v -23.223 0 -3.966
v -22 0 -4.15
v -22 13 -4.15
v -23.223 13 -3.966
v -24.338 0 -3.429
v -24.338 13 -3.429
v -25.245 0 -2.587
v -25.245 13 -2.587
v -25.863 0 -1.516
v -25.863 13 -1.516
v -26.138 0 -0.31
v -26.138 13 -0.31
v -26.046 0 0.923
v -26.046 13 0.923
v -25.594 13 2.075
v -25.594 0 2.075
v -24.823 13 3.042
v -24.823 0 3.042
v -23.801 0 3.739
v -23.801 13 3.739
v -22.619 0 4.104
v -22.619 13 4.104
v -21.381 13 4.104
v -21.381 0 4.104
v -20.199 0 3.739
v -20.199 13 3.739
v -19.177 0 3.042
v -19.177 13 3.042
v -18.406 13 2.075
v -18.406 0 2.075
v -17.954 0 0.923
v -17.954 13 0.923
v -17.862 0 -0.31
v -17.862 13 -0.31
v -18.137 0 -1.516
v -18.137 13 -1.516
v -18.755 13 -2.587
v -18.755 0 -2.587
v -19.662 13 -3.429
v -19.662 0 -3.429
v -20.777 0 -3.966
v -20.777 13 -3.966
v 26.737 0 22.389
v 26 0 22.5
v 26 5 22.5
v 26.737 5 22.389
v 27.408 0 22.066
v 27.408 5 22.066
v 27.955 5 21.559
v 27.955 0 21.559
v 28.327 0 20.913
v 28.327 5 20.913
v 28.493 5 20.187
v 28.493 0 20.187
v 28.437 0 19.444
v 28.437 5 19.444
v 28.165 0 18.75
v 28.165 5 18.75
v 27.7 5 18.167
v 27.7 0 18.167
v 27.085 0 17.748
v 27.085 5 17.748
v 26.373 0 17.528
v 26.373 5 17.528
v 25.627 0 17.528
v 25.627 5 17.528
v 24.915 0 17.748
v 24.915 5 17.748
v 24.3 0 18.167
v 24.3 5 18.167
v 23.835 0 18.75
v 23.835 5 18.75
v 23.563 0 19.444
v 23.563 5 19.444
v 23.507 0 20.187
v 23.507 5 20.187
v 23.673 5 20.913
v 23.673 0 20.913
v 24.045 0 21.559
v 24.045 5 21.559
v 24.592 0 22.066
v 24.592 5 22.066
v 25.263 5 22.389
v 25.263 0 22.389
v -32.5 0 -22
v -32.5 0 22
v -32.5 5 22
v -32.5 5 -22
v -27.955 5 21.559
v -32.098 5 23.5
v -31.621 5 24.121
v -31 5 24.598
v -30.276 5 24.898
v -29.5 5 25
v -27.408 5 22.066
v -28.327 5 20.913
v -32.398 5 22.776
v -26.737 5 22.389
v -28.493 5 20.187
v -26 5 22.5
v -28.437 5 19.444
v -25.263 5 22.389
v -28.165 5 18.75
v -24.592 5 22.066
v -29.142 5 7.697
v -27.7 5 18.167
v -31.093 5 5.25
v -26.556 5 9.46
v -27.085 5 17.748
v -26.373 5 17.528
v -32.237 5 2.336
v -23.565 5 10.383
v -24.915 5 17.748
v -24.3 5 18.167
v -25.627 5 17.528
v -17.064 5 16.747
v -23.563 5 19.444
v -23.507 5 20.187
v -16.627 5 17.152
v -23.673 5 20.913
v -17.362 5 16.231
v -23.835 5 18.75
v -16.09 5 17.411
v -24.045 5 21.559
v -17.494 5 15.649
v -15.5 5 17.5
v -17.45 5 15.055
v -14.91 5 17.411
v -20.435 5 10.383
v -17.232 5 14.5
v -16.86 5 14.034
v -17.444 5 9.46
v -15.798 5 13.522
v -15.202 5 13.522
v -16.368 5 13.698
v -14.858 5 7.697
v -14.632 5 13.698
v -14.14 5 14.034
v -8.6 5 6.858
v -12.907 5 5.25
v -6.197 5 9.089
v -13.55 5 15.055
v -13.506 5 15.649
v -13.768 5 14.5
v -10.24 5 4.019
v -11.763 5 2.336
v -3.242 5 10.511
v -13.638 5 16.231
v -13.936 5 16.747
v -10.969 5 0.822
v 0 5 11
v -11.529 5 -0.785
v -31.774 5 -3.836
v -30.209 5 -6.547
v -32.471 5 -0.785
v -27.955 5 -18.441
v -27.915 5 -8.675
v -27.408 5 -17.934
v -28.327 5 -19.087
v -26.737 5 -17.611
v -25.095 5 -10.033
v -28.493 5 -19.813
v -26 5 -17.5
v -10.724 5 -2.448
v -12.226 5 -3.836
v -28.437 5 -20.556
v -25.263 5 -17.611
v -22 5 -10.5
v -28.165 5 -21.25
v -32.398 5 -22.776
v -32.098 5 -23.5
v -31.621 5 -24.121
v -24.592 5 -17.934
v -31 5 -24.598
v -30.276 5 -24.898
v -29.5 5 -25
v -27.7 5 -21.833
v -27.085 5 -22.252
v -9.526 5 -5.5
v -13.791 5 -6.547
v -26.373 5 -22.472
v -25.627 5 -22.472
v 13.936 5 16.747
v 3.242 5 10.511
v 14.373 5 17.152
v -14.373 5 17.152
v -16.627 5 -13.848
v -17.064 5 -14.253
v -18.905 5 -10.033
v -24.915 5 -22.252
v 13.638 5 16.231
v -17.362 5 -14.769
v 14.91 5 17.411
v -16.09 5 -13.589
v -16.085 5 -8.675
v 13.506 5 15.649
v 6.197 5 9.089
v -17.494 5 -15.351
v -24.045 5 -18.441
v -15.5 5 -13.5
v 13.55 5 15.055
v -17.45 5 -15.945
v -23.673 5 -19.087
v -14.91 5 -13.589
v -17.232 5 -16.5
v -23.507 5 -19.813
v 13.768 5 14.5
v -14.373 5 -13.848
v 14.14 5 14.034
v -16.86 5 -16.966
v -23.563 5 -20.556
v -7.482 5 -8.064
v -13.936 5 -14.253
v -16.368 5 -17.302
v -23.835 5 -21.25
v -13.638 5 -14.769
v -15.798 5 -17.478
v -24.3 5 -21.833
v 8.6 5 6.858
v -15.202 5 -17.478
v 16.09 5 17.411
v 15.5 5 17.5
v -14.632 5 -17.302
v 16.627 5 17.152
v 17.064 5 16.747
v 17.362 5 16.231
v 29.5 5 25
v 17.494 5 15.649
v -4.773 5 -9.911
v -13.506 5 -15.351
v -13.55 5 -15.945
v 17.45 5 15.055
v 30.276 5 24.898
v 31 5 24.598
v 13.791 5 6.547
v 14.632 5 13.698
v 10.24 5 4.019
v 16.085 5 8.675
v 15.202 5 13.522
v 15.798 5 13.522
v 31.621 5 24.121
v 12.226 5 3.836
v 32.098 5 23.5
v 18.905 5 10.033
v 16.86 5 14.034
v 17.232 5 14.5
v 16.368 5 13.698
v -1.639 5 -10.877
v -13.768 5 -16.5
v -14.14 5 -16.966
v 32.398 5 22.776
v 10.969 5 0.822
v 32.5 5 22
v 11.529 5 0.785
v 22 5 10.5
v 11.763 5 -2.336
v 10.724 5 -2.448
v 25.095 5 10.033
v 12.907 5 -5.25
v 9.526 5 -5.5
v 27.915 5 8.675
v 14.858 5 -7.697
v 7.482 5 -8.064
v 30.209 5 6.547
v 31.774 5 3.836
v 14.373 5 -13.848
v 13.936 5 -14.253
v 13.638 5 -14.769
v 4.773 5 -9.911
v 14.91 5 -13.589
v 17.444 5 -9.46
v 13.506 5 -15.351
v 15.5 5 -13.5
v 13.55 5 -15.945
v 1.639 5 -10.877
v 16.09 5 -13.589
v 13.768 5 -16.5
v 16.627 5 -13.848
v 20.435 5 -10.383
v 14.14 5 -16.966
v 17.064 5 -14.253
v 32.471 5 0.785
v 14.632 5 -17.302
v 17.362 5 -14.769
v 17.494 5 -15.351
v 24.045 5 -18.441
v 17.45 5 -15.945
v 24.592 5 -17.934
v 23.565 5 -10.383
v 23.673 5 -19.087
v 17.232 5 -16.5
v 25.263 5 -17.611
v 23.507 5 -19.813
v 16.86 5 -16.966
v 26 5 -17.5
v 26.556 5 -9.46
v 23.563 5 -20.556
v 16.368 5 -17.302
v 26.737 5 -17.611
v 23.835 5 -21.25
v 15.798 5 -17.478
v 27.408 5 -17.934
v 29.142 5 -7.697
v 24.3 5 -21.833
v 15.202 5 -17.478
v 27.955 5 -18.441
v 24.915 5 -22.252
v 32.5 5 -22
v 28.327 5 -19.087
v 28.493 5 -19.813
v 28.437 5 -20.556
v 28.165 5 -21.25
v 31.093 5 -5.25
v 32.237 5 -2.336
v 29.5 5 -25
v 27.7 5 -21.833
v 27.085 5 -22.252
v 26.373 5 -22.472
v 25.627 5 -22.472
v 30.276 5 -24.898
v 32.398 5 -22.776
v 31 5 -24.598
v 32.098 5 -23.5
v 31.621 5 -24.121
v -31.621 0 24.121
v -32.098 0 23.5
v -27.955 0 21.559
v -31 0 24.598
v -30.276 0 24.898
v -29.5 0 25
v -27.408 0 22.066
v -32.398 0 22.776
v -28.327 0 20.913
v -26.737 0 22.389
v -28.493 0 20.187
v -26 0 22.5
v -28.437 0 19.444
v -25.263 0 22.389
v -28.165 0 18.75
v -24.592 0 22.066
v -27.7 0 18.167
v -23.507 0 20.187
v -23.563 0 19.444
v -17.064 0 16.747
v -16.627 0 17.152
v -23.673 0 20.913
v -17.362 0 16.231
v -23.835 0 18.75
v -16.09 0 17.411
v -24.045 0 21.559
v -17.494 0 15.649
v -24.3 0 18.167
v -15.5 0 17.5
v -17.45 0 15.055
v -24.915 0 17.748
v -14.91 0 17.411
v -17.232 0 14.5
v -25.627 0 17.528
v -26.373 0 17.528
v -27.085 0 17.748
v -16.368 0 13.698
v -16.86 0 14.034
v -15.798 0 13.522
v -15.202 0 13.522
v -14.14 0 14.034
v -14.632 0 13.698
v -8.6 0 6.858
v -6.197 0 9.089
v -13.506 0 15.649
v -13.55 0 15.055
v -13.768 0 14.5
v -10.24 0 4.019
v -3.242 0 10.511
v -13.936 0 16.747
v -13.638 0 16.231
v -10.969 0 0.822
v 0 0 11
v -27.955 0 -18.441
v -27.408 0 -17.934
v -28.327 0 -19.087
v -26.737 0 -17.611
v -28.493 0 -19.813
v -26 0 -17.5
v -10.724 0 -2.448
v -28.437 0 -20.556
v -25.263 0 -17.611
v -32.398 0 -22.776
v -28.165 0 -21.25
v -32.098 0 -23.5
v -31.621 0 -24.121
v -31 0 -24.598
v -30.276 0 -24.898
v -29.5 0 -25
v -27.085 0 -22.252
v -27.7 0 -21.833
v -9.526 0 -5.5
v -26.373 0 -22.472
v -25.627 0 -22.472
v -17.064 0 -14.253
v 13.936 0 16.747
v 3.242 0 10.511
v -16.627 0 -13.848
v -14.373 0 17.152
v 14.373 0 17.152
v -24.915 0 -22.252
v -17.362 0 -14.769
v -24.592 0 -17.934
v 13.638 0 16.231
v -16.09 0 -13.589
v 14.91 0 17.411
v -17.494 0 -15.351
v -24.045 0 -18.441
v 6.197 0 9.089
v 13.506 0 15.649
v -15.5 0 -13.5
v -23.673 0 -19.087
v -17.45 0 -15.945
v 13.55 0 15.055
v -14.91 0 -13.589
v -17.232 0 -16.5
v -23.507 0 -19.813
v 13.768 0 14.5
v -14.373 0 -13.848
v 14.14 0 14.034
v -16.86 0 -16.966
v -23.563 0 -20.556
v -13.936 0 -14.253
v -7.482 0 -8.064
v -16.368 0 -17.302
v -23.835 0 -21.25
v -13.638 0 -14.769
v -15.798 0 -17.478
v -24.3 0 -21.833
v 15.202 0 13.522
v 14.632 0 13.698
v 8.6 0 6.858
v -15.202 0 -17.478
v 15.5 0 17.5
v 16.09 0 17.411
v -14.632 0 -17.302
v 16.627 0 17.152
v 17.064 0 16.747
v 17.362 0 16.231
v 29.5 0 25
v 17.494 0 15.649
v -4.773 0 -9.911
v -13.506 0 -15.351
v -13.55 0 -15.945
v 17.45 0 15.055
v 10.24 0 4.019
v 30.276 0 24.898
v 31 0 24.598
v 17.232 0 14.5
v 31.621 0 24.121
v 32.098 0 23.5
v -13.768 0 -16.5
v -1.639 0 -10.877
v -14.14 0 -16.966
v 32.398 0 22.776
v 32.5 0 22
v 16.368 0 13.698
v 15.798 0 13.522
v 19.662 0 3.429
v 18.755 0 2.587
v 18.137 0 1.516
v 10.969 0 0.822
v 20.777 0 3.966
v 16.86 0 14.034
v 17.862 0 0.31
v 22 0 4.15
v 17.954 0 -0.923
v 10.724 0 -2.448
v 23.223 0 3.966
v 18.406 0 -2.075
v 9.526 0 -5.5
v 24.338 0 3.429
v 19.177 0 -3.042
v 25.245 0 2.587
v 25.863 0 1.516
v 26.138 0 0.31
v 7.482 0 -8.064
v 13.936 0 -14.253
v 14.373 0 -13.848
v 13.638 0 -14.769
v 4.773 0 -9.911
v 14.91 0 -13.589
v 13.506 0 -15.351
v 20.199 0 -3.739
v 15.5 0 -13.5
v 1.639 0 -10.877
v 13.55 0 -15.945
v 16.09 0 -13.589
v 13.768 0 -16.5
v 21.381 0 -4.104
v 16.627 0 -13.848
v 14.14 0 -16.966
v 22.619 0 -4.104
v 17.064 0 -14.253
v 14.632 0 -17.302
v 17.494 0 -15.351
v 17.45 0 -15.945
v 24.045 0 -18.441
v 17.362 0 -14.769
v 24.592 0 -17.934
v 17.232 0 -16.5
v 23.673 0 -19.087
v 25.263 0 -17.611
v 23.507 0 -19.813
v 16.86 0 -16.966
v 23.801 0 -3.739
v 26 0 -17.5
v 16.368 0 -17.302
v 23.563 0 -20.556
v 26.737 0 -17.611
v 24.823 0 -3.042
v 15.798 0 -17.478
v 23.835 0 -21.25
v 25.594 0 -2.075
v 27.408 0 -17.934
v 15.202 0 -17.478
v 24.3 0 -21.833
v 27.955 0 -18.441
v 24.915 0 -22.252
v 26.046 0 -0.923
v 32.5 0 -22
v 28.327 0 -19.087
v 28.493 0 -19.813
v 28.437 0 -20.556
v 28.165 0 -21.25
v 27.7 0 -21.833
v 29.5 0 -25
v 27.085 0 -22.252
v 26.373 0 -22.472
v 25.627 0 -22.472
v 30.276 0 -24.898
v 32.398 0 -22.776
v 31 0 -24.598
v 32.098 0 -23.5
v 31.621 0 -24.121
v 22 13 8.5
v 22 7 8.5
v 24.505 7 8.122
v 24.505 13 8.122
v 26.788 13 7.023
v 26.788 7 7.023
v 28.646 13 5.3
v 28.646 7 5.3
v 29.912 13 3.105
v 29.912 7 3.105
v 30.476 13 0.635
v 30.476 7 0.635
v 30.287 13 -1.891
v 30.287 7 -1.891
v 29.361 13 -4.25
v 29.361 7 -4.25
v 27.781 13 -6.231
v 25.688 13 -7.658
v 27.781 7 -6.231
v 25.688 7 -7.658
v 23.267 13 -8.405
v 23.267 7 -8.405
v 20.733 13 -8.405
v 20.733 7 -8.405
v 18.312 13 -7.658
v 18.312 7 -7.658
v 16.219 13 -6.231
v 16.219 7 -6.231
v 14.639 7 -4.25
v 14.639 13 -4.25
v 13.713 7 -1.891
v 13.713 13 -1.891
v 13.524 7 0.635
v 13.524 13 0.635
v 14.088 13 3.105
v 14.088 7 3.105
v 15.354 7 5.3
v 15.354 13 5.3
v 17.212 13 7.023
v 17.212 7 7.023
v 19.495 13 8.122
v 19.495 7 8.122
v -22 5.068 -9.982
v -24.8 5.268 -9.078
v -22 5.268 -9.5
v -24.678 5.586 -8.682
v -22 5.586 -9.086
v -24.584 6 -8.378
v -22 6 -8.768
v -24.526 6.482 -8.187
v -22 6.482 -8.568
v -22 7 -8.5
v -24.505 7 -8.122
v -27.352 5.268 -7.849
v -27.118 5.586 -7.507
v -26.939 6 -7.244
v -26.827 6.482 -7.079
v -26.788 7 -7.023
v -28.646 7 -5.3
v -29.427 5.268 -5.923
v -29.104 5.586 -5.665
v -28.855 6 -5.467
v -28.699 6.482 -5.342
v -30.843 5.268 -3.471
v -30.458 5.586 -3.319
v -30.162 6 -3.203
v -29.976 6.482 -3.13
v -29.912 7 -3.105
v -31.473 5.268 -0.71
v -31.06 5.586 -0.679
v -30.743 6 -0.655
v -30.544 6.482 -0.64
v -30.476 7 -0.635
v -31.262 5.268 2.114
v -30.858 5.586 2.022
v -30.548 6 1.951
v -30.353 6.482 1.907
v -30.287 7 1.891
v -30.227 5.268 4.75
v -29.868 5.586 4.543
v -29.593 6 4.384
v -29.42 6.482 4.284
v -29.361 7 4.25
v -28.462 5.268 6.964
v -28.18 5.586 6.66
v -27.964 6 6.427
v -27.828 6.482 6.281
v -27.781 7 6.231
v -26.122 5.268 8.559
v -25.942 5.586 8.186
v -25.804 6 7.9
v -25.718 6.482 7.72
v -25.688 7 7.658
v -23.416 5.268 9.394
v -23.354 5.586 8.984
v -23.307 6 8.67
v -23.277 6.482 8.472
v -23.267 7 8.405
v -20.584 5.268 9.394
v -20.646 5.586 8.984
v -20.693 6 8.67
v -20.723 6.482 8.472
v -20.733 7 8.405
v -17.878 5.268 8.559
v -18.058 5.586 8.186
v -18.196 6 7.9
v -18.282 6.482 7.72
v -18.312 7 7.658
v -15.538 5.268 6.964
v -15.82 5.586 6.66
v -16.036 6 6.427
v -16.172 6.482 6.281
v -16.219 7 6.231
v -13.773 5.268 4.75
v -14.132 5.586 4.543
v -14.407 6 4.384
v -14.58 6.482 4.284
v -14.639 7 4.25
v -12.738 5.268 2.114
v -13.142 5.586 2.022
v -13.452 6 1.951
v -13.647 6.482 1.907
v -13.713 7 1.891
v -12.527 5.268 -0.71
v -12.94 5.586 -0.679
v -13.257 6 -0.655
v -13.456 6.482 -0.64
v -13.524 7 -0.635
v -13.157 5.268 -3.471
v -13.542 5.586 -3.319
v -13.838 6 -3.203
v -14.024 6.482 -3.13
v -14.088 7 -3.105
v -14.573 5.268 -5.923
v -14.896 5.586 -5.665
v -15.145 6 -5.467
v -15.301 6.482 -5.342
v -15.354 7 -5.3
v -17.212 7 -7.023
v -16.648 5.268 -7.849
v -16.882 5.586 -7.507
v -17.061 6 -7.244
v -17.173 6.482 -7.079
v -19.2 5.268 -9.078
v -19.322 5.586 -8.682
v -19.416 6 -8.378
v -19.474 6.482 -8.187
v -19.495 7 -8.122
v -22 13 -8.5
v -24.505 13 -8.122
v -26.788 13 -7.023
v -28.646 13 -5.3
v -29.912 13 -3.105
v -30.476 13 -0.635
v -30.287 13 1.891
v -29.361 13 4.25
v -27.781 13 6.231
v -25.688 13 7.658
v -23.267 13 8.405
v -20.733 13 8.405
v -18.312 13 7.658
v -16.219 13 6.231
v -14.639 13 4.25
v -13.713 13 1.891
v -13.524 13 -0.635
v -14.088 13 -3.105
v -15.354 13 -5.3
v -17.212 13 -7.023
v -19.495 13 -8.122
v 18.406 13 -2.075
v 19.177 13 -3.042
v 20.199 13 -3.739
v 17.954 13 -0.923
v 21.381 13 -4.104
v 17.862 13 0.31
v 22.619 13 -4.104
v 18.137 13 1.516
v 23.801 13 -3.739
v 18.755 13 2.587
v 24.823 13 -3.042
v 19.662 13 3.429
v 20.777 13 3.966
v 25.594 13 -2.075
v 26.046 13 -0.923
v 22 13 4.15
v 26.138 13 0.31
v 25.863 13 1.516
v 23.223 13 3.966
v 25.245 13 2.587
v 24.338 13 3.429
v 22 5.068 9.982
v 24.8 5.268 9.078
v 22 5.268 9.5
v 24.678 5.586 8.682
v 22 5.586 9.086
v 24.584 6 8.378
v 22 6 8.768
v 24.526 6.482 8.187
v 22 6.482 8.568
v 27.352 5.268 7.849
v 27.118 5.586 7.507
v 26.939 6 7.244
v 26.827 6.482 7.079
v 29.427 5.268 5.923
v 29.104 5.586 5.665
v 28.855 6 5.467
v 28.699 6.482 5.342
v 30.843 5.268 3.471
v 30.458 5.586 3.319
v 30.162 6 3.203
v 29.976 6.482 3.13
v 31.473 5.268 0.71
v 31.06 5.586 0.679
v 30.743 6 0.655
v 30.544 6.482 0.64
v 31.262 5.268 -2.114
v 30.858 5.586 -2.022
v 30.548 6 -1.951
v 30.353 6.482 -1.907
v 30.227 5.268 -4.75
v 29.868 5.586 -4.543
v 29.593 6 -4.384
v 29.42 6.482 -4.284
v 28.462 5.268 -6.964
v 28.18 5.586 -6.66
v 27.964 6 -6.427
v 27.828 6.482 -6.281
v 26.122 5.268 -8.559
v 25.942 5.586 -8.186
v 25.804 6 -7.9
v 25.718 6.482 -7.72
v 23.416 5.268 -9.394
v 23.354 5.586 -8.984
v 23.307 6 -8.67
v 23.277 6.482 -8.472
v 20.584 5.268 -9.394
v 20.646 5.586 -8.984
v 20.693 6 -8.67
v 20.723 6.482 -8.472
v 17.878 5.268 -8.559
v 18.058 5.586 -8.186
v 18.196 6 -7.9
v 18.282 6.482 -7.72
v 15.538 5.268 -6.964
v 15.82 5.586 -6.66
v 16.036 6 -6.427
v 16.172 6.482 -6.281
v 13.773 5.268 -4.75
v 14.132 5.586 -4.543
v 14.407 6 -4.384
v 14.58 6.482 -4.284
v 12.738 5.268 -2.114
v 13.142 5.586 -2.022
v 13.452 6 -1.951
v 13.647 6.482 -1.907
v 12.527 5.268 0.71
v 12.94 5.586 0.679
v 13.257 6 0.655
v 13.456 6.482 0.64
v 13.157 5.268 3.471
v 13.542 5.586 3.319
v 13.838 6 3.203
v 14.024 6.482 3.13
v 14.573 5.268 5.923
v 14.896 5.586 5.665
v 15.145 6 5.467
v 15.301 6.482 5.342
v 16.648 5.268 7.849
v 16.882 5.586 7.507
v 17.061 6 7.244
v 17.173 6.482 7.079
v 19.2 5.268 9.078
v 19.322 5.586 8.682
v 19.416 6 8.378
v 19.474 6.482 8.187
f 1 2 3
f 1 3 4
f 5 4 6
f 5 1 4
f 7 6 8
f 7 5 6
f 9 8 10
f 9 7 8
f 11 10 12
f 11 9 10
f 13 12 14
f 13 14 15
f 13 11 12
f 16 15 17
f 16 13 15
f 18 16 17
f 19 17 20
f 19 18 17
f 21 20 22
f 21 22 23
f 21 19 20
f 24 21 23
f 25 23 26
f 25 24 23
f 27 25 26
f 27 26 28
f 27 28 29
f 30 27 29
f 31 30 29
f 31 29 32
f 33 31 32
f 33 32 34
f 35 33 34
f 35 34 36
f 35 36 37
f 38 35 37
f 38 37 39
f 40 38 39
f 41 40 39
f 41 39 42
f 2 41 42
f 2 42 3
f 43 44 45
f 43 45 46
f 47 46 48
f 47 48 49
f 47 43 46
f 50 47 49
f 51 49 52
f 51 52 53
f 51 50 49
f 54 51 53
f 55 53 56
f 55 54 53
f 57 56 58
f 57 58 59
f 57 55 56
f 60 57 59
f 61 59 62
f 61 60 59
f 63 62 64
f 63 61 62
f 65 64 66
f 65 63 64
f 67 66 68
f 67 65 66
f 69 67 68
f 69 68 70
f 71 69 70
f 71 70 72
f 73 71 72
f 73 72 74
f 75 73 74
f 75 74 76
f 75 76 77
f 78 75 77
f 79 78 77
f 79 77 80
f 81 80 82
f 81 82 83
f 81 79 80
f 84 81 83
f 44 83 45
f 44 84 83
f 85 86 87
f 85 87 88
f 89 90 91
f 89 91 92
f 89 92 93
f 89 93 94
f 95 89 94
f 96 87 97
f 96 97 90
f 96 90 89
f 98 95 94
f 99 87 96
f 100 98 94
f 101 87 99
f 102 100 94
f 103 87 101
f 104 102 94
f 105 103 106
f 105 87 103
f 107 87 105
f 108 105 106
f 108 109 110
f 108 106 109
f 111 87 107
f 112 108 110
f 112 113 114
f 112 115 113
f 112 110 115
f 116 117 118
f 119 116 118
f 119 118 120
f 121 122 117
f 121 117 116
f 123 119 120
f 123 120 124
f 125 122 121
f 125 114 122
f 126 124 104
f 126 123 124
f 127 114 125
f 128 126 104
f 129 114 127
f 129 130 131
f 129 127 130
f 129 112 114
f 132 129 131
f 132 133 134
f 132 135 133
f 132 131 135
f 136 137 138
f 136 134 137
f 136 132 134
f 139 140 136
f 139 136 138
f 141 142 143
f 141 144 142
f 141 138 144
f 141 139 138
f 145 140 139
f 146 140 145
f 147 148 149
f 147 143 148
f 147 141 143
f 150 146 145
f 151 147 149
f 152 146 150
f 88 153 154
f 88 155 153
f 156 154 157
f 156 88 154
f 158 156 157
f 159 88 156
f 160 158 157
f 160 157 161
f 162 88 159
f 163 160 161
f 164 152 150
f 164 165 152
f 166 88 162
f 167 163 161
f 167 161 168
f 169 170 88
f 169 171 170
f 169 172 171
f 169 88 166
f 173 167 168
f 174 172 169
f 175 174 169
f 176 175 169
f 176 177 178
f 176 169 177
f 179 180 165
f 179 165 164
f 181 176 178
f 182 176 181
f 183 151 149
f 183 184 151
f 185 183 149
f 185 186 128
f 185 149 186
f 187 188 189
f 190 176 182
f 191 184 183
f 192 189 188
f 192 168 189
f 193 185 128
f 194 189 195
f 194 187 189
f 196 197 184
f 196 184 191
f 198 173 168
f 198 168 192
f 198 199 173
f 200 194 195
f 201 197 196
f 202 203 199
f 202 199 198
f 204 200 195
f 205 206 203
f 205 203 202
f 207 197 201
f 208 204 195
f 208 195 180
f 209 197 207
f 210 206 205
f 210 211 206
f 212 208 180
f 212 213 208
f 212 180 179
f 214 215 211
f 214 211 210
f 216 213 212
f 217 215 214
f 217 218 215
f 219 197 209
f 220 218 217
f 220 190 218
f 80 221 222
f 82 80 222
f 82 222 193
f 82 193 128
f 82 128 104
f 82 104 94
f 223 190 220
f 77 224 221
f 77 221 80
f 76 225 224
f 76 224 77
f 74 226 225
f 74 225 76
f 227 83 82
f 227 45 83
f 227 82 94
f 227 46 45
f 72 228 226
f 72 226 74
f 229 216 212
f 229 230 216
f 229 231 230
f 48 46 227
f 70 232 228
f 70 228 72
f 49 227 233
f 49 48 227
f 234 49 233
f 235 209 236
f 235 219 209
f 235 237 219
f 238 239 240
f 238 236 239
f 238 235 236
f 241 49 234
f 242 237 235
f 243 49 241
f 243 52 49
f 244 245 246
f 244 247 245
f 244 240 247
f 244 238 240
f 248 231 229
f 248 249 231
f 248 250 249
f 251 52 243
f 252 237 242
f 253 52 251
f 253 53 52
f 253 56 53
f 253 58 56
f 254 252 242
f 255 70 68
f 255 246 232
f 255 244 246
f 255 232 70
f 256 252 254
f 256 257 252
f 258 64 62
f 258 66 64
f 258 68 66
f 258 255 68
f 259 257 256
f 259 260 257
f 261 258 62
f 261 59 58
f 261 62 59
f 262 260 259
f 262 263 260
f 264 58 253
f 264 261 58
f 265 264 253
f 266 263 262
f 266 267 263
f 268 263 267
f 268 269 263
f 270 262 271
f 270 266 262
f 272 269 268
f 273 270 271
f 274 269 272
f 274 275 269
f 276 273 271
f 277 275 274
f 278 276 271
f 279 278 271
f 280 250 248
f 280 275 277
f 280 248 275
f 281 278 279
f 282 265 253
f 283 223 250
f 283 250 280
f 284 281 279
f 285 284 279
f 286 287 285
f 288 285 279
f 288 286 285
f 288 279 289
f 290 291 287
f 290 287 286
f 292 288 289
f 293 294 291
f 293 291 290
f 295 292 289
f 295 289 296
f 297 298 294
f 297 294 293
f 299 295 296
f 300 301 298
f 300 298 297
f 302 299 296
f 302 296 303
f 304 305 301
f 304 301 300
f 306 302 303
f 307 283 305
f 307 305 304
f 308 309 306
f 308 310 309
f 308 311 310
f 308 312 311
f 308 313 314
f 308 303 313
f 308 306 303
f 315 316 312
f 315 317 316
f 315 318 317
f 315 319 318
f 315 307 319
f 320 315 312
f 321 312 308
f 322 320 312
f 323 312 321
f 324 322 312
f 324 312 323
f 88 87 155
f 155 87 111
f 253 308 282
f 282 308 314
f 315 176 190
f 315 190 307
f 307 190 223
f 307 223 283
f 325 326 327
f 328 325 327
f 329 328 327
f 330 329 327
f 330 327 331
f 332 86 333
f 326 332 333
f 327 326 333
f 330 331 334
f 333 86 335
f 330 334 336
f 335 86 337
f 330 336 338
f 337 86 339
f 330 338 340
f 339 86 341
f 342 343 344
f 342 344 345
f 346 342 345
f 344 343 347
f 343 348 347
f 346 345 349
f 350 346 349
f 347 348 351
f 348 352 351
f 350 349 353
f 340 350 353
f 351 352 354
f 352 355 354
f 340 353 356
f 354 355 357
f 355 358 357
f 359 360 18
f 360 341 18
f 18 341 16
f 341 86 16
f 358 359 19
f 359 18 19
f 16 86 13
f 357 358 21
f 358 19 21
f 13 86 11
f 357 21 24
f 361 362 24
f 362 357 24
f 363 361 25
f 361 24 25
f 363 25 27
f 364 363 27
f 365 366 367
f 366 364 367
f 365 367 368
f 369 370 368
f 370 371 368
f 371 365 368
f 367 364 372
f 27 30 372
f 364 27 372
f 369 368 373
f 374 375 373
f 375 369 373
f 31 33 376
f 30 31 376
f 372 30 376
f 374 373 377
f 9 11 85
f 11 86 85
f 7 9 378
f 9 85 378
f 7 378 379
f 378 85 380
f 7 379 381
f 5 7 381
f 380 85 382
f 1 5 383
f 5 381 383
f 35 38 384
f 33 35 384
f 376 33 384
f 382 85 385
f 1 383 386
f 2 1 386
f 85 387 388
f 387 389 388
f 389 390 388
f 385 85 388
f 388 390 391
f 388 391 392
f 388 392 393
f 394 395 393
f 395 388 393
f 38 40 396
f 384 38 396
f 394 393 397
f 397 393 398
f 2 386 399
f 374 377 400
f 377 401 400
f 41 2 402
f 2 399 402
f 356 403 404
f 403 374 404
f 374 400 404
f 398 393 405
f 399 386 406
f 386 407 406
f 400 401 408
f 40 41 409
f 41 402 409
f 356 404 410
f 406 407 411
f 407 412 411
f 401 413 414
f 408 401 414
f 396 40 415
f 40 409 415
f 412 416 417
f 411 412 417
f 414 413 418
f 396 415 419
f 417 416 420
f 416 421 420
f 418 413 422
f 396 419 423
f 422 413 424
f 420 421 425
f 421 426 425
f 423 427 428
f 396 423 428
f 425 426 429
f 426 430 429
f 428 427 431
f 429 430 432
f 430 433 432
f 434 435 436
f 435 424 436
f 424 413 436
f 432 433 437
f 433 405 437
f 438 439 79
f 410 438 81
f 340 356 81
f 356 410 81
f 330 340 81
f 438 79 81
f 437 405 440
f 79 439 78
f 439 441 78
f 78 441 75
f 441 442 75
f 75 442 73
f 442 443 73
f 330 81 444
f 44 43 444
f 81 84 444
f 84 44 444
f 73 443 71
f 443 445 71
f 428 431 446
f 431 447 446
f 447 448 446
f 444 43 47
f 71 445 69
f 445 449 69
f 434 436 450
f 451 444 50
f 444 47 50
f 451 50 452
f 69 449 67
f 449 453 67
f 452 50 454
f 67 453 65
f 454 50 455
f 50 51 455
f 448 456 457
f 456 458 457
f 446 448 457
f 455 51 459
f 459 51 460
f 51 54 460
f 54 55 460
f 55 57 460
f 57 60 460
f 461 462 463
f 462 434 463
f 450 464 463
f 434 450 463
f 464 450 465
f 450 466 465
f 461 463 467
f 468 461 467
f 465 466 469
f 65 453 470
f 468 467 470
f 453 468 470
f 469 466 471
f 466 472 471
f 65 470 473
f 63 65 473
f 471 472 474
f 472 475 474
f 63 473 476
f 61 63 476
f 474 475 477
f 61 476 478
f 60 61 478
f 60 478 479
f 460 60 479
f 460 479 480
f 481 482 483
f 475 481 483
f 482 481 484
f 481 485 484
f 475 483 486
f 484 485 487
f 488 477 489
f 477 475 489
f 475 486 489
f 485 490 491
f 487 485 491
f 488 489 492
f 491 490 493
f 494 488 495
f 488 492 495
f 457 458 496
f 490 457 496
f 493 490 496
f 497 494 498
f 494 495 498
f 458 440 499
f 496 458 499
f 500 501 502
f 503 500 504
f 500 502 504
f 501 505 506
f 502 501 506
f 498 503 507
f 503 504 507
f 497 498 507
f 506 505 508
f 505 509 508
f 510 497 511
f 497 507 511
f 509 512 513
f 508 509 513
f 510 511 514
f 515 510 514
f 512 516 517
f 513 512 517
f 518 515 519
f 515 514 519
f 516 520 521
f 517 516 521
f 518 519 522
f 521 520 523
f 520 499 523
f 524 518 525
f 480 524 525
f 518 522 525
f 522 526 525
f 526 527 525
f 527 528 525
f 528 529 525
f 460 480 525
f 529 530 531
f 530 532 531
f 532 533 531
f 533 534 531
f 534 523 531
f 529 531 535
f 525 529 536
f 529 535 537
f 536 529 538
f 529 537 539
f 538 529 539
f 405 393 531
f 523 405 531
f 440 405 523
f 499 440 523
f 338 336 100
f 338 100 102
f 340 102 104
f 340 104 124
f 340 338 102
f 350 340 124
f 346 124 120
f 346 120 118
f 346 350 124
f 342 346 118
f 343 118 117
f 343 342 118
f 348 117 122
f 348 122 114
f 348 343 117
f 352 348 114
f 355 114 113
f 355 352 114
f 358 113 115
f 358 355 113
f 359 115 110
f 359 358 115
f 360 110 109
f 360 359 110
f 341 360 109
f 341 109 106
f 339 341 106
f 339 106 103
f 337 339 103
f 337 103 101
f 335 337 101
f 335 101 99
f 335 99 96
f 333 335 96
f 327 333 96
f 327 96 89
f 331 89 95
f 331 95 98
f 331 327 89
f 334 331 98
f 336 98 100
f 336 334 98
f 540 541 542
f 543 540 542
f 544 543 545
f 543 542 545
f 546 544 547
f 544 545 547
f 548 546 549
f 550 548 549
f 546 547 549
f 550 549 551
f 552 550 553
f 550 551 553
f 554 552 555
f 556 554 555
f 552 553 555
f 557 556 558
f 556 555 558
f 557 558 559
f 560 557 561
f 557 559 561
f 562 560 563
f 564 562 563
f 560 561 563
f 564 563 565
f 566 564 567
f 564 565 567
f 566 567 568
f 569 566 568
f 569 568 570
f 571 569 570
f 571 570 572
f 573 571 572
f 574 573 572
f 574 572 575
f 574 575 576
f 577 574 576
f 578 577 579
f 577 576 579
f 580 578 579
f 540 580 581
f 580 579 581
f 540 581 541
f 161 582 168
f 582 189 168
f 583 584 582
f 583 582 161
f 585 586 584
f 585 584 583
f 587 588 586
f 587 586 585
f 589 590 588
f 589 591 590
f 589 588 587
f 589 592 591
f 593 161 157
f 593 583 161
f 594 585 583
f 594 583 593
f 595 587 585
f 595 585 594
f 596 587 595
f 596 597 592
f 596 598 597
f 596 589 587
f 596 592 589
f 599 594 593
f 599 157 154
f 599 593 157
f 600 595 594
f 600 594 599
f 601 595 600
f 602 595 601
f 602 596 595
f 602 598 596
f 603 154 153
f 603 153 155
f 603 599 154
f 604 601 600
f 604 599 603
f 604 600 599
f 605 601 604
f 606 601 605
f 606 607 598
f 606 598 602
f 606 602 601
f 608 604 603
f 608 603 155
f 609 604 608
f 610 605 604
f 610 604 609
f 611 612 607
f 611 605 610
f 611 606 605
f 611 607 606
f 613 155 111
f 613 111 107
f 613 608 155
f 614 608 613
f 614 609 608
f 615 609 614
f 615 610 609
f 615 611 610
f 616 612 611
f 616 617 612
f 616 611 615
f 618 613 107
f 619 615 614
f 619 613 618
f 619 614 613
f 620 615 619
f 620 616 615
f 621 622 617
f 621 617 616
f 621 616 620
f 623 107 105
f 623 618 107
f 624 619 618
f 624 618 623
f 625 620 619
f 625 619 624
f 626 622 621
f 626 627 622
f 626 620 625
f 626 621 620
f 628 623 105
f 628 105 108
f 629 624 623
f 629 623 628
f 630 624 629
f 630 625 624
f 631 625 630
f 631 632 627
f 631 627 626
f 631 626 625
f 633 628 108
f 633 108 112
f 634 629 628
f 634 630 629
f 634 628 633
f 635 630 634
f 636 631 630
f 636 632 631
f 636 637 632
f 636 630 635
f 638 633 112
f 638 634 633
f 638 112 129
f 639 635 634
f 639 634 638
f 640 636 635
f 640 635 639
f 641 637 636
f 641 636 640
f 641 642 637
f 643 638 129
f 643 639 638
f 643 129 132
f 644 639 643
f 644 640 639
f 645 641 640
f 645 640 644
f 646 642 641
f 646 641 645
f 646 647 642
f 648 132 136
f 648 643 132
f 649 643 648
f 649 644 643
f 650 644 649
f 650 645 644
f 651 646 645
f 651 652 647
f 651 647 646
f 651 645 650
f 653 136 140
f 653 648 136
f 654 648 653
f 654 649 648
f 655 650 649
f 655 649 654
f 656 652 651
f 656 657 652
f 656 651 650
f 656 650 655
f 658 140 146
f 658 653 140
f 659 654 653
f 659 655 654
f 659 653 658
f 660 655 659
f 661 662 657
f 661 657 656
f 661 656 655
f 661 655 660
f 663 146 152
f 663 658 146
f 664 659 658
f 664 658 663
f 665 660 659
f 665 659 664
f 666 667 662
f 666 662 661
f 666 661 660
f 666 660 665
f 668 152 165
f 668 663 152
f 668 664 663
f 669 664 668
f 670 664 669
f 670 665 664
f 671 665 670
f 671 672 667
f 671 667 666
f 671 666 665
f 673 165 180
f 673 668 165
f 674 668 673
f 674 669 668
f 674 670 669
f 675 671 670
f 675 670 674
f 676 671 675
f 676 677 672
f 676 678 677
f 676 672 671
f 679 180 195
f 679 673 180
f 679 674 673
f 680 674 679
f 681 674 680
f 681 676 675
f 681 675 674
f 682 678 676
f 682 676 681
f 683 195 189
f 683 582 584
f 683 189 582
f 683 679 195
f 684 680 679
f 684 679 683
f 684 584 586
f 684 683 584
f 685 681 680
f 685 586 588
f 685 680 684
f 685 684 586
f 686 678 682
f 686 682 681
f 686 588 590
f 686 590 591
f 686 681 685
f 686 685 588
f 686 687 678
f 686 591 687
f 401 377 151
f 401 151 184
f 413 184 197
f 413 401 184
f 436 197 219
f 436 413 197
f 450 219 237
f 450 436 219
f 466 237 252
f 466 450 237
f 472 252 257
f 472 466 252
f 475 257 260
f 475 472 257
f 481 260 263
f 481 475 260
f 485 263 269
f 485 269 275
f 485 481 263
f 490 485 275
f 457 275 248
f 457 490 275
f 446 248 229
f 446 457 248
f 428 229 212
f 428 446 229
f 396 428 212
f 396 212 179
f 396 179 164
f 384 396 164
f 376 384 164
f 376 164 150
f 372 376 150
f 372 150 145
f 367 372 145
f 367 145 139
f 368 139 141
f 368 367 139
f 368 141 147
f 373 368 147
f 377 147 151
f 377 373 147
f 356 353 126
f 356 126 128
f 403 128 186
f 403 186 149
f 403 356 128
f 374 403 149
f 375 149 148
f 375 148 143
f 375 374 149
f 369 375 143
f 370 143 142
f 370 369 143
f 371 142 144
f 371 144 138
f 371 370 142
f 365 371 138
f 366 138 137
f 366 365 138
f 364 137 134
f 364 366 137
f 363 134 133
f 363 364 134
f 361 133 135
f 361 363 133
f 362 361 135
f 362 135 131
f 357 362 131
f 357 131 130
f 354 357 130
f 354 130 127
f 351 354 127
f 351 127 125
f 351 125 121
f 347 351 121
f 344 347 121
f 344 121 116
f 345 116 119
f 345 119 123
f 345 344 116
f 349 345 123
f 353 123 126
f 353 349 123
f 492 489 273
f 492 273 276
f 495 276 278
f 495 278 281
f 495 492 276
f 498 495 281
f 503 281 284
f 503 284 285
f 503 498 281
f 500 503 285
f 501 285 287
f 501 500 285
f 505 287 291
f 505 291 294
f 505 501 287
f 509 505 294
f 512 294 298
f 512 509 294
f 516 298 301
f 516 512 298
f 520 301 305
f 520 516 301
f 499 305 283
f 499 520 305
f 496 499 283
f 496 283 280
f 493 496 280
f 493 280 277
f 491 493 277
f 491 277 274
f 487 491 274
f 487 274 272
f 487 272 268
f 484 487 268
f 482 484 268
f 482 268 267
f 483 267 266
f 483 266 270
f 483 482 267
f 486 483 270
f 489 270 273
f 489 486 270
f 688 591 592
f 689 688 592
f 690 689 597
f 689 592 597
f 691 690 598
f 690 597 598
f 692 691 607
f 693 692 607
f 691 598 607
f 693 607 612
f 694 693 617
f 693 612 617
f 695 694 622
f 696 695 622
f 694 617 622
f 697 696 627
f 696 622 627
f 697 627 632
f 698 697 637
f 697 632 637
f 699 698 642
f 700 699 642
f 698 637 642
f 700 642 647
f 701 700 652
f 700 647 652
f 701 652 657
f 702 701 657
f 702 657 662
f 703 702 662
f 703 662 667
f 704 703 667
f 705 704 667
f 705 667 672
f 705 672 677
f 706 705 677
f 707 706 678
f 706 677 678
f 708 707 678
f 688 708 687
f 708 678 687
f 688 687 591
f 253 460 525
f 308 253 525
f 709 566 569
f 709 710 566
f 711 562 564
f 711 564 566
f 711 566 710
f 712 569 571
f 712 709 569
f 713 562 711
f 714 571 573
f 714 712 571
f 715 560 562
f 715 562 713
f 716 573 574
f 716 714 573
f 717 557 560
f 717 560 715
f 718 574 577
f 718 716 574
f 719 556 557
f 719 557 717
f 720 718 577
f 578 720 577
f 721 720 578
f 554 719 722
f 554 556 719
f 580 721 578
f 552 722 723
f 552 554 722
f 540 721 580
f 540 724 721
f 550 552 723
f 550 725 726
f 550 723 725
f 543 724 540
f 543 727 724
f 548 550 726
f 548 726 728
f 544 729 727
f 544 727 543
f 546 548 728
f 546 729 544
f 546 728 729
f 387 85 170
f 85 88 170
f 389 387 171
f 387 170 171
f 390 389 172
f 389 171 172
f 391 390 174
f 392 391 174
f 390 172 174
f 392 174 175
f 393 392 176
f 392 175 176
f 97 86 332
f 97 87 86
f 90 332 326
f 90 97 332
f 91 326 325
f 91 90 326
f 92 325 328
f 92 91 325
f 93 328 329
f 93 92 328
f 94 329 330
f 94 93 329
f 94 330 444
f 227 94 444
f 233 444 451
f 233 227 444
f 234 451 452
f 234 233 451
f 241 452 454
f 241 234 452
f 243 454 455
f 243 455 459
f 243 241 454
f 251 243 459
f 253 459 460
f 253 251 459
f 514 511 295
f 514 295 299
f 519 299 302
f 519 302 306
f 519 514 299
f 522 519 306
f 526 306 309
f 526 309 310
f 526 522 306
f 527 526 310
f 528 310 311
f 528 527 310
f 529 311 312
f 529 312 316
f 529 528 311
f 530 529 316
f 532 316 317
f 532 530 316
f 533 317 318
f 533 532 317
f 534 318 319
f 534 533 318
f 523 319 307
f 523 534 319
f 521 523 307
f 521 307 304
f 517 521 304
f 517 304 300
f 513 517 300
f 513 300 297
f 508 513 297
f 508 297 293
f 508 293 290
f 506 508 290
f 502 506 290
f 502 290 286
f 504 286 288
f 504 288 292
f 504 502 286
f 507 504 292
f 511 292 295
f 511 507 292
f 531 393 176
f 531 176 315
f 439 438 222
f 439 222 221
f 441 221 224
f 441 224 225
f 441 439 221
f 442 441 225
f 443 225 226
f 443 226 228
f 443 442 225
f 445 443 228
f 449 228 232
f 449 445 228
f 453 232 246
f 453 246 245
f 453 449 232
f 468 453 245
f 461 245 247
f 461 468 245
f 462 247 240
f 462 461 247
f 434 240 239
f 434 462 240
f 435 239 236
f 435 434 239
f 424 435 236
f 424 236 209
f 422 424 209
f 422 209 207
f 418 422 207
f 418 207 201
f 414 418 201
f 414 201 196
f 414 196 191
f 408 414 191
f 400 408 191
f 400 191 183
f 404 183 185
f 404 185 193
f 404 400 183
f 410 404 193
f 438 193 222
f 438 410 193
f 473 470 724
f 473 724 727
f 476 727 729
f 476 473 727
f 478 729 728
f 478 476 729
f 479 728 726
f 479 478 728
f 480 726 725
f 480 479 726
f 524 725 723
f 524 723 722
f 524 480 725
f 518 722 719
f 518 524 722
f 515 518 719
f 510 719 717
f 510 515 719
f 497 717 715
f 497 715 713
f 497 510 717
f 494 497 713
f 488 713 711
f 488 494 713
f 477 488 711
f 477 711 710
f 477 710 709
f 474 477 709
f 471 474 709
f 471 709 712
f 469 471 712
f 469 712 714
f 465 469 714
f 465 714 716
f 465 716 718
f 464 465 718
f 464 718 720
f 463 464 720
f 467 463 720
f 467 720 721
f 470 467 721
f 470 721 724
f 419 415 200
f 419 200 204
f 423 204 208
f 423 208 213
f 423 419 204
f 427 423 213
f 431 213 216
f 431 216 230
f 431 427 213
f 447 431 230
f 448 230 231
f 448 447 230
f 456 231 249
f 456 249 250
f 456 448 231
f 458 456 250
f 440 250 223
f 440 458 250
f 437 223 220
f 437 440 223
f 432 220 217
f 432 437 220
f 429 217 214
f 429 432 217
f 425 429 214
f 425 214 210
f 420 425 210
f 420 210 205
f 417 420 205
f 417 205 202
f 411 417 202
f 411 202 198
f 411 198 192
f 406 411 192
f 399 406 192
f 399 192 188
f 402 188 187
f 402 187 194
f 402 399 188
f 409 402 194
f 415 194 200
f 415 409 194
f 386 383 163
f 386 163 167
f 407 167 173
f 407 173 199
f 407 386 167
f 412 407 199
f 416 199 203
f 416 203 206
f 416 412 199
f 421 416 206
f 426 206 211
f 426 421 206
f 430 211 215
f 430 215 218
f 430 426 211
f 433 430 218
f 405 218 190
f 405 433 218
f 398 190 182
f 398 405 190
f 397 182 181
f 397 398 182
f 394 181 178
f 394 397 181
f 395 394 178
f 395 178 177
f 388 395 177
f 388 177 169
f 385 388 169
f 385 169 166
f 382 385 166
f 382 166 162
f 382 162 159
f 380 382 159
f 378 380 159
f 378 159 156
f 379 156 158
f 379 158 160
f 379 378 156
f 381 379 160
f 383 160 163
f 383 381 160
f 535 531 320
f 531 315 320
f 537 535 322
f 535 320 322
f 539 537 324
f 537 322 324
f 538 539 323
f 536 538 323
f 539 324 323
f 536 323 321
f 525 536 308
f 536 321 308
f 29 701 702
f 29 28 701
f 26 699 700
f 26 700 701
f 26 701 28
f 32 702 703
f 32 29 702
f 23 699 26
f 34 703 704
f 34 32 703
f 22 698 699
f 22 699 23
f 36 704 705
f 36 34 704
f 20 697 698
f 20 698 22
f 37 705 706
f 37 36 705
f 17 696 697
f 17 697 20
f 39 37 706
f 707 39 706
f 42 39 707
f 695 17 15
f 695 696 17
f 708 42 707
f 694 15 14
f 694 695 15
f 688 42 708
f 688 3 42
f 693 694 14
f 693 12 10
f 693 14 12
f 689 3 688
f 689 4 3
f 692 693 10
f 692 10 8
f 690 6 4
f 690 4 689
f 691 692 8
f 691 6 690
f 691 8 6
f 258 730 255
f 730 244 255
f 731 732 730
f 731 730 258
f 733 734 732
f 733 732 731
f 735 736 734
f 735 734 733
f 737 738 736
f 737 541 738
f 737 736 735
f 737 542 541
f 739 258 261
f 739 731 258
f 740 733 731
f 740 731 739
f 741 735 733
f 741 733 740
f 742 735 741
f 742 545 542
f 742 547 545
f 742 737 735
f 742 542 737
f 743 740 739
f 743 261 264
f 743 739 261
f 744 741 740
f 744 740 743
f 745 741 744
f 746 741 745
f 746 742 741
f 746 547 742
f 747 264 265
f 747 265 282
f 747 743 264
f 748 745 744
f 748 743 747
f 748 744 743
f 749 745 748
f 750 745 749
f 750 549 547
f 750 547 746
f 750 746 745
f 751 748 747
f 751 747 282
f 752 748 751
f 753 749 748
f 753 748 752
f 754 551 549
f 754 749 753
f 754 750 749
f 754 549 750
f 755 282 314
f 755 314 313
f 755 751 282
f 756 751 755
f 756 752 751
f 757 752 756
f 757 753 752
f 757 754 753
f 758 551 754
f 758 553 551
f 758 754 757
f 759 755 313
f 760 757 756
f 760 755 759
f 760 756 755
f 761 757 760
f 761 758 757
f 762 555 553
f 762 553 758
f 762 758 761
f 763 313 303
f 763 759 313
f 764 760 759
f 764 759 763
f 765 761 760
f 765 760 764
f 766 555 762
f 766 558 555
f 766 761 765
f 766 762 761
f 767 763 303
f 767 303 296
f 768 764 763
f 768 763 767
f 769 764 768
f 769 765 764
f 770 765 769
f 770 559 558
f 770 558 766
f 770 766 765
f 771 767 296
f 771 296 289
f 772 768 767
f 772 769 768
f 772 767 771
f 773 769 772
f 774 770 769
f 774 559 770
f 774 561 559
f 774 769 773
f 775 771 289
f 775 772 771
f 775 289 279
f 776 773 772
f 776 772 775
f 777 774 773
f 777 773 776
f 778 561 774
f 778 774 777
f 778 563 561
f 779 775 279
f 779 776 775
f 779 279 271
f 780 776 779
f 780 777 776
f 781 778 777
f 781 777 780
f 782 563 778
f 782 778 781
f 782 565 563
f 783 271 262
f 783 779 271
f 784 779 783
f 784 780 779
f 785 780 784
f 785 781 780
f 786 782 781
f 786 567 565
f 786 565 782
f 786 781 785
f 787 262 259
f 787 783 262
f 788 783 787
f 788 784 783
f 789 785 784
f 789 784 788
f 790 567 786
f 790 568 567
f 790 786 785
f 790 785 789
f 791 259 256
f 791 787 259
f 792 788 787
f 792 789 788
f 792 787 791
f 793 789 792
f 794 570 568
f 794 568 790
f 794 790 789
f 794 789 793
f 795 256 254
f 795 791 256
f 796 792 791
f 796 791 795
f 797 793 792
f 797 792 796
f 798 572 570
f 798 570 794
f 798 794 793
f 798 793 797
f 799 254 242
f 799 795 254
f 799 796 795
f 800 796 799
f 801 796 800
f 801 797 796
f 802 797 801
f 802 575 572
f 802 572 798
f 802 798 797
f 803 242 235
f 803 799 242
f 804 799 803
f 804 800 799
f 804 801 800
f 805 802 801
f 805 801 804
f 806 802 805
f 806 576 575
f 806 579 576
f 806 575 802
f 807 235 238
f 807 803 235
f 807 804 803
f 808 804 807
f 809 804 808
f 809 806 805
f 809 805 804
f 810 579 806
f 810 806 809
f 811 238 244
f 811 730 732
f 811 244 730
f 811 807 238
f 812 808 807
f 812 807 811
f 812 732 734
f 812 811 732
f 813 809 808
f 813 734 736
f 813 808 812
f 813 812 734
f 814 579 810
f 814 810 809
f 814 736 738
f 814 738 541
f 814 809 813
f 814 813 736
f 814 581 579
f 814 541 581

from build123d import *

# Parameters (mm, degrees)
SKETCH1_W           = 65
SKETCH1_H           = 50
SKETCH1_R           = 11
SKETCH1_R_2         = 2
SKETCH1_R_3         = 2.5
BOSS_EXTRUDE1_DEPTH = 5
SKETCH2_R           = 8.5
SKETCH2_R_2         = 4.15
BOSS_EXTRUDE2_DEPTH = 8
FILLET1_R           = 3
CUT_EXTRUDE1_START  = -8
SKETCH3_R           = 4.15
CUT_EXTRUDE1_DEPTH  = 8
FILLET2_R           = 2


with BuildPart() as part:
    # Sketch1 → Boss-Extrude1 (new body)
    with BuildSketch(Plane(origin=(0, 0, 0), x_dir=(1, 0, 0), z_dir=(0, 1, 0))):
        Rectangle(SKETCH1_W, SKETCH1_H)
        with Locations(Location((0, 0, 0), (0, 0, 270))):
            Circle(SKETCH1_R, mode=Mode.SUBTRACT)
        with Locations(Location((15.5, 15.5, 0), (0, 0, 270))):
            Circle(SKETCH1_R_2, mode=Mode.SUBTRACT)
        with Locations(Location((-15.5, 15.5, 0), (0, 0, 270))):
            Circle(SKETCH1_R_2, mode=Mode.SUBTRACT)
        with Locations(Location((15.5, -15.5, 0), (0, 0, 270))):
            Circle(SKETCH1_R_2, mode=Mode.SUBTRACT)
        with Locations(Location((-15.5, -15.5, 0), (0, 0, 270))):
            Circle(SKETCH1_R_2, mode=Mode.SUBTRACT)
        with Locations(Location((26, 20, 0), (0, 0, 270))):
            Circle(SKETCH1_R_3, mode=Mode.SUBTRACT)
        with Locations(Location((-26, 20, 0), (0, 0, 270))):
            Circle(SKETCH1_R_3, mode=Mode.SUBTRACT)
        with Locations(Location((-26, -20, 0), (0, 0, 270))):
            Circle(SKETCH1_R_3, mode=Mode.SUBTRACT)
        with Locations(Location((26, -20, 0), (0, 0, 270))):
            Circle(SKETCH1_R_3, mode=Mode.SUBTRACT)
    extrude(amount=BOSS_EXTRUDE1_DEPTH)

    # Sketch2 → Boss-Extrude2 (add)
    # profile 1 of 2: a face of its own
    with BuildSketch(Plane(origin=(0, 5, 0), x_dir=(1, 0, 0), z_dir=(0, 1, 0))):
        with Locations(Location((22, 0, 0), (0, 0, 270))):
            Circle(SKETCH2_R)
        with Locations(Location((22, 0, 0), (0, 0, 270))):
            Circle(SKETCH2_R_2, mode=Mode.SUBTRACT)
    # profile 2 of 2: a face of its own
    with BuildSketch(Plane(origin=(0, 5, 0), x_dir=(1, 0, 0), z_dir=(0, 1, 0))):
        with Locations(Location((-22, 0, 0), (0, 0, 90))):
            Circle(SKETCH2_R)
        with Locations(Location((-22, 0, 0), (0, 0, 90))):
            Circle(SKETCH2_R_2, mode=Mode.SUBTRACT)
    extrude(amount=BOSS_EXTRUDE2_DEPTH)

    # Fillet1
    fillet1_edges = [part.edges().sort_by_distance(p)[0] for p in [
        (32.5, 2.5, 25),
        (-32.5, 2.5, 25),
        (-32.5, 2.5, -25),
        (32.5, 2.5, -25),
    ]]
    fillet(fillet1_edges, radius=FILLET1_R)

    # Sketch3 → Cut-Extrude1 (cut)
    with BuildSketch(Plane(origin=(0, 5, 0), x_dir=(1, 0, 0), z_dir=(0, 1, 0)).offset(CUT_EXTRUDE1_START)):
        with Locations(Location((-22, 0, 0), (0, 0, 90))):
            Circle(SKETCH3_R)
        with Locations(Location((22, 0, 0), (0, 0, 270))):
            Circle(SKETCH3_R)
    extrude(amount=CUT_EXTRUDE1_DEPTH, mode=Mode.SUBTRACT)

    # Fillet2
    fillet2_edges = [part.edges().sort_by_distance(p)[0] for p in [
        (22, 5, -8.5),
        (-22, 5, 8.5),
    ]]
    fillet(fillet2_edges, radius=FILLET2_R - 0.0001)  # a hair under: the kernel refuses the full size


solid = part.part
